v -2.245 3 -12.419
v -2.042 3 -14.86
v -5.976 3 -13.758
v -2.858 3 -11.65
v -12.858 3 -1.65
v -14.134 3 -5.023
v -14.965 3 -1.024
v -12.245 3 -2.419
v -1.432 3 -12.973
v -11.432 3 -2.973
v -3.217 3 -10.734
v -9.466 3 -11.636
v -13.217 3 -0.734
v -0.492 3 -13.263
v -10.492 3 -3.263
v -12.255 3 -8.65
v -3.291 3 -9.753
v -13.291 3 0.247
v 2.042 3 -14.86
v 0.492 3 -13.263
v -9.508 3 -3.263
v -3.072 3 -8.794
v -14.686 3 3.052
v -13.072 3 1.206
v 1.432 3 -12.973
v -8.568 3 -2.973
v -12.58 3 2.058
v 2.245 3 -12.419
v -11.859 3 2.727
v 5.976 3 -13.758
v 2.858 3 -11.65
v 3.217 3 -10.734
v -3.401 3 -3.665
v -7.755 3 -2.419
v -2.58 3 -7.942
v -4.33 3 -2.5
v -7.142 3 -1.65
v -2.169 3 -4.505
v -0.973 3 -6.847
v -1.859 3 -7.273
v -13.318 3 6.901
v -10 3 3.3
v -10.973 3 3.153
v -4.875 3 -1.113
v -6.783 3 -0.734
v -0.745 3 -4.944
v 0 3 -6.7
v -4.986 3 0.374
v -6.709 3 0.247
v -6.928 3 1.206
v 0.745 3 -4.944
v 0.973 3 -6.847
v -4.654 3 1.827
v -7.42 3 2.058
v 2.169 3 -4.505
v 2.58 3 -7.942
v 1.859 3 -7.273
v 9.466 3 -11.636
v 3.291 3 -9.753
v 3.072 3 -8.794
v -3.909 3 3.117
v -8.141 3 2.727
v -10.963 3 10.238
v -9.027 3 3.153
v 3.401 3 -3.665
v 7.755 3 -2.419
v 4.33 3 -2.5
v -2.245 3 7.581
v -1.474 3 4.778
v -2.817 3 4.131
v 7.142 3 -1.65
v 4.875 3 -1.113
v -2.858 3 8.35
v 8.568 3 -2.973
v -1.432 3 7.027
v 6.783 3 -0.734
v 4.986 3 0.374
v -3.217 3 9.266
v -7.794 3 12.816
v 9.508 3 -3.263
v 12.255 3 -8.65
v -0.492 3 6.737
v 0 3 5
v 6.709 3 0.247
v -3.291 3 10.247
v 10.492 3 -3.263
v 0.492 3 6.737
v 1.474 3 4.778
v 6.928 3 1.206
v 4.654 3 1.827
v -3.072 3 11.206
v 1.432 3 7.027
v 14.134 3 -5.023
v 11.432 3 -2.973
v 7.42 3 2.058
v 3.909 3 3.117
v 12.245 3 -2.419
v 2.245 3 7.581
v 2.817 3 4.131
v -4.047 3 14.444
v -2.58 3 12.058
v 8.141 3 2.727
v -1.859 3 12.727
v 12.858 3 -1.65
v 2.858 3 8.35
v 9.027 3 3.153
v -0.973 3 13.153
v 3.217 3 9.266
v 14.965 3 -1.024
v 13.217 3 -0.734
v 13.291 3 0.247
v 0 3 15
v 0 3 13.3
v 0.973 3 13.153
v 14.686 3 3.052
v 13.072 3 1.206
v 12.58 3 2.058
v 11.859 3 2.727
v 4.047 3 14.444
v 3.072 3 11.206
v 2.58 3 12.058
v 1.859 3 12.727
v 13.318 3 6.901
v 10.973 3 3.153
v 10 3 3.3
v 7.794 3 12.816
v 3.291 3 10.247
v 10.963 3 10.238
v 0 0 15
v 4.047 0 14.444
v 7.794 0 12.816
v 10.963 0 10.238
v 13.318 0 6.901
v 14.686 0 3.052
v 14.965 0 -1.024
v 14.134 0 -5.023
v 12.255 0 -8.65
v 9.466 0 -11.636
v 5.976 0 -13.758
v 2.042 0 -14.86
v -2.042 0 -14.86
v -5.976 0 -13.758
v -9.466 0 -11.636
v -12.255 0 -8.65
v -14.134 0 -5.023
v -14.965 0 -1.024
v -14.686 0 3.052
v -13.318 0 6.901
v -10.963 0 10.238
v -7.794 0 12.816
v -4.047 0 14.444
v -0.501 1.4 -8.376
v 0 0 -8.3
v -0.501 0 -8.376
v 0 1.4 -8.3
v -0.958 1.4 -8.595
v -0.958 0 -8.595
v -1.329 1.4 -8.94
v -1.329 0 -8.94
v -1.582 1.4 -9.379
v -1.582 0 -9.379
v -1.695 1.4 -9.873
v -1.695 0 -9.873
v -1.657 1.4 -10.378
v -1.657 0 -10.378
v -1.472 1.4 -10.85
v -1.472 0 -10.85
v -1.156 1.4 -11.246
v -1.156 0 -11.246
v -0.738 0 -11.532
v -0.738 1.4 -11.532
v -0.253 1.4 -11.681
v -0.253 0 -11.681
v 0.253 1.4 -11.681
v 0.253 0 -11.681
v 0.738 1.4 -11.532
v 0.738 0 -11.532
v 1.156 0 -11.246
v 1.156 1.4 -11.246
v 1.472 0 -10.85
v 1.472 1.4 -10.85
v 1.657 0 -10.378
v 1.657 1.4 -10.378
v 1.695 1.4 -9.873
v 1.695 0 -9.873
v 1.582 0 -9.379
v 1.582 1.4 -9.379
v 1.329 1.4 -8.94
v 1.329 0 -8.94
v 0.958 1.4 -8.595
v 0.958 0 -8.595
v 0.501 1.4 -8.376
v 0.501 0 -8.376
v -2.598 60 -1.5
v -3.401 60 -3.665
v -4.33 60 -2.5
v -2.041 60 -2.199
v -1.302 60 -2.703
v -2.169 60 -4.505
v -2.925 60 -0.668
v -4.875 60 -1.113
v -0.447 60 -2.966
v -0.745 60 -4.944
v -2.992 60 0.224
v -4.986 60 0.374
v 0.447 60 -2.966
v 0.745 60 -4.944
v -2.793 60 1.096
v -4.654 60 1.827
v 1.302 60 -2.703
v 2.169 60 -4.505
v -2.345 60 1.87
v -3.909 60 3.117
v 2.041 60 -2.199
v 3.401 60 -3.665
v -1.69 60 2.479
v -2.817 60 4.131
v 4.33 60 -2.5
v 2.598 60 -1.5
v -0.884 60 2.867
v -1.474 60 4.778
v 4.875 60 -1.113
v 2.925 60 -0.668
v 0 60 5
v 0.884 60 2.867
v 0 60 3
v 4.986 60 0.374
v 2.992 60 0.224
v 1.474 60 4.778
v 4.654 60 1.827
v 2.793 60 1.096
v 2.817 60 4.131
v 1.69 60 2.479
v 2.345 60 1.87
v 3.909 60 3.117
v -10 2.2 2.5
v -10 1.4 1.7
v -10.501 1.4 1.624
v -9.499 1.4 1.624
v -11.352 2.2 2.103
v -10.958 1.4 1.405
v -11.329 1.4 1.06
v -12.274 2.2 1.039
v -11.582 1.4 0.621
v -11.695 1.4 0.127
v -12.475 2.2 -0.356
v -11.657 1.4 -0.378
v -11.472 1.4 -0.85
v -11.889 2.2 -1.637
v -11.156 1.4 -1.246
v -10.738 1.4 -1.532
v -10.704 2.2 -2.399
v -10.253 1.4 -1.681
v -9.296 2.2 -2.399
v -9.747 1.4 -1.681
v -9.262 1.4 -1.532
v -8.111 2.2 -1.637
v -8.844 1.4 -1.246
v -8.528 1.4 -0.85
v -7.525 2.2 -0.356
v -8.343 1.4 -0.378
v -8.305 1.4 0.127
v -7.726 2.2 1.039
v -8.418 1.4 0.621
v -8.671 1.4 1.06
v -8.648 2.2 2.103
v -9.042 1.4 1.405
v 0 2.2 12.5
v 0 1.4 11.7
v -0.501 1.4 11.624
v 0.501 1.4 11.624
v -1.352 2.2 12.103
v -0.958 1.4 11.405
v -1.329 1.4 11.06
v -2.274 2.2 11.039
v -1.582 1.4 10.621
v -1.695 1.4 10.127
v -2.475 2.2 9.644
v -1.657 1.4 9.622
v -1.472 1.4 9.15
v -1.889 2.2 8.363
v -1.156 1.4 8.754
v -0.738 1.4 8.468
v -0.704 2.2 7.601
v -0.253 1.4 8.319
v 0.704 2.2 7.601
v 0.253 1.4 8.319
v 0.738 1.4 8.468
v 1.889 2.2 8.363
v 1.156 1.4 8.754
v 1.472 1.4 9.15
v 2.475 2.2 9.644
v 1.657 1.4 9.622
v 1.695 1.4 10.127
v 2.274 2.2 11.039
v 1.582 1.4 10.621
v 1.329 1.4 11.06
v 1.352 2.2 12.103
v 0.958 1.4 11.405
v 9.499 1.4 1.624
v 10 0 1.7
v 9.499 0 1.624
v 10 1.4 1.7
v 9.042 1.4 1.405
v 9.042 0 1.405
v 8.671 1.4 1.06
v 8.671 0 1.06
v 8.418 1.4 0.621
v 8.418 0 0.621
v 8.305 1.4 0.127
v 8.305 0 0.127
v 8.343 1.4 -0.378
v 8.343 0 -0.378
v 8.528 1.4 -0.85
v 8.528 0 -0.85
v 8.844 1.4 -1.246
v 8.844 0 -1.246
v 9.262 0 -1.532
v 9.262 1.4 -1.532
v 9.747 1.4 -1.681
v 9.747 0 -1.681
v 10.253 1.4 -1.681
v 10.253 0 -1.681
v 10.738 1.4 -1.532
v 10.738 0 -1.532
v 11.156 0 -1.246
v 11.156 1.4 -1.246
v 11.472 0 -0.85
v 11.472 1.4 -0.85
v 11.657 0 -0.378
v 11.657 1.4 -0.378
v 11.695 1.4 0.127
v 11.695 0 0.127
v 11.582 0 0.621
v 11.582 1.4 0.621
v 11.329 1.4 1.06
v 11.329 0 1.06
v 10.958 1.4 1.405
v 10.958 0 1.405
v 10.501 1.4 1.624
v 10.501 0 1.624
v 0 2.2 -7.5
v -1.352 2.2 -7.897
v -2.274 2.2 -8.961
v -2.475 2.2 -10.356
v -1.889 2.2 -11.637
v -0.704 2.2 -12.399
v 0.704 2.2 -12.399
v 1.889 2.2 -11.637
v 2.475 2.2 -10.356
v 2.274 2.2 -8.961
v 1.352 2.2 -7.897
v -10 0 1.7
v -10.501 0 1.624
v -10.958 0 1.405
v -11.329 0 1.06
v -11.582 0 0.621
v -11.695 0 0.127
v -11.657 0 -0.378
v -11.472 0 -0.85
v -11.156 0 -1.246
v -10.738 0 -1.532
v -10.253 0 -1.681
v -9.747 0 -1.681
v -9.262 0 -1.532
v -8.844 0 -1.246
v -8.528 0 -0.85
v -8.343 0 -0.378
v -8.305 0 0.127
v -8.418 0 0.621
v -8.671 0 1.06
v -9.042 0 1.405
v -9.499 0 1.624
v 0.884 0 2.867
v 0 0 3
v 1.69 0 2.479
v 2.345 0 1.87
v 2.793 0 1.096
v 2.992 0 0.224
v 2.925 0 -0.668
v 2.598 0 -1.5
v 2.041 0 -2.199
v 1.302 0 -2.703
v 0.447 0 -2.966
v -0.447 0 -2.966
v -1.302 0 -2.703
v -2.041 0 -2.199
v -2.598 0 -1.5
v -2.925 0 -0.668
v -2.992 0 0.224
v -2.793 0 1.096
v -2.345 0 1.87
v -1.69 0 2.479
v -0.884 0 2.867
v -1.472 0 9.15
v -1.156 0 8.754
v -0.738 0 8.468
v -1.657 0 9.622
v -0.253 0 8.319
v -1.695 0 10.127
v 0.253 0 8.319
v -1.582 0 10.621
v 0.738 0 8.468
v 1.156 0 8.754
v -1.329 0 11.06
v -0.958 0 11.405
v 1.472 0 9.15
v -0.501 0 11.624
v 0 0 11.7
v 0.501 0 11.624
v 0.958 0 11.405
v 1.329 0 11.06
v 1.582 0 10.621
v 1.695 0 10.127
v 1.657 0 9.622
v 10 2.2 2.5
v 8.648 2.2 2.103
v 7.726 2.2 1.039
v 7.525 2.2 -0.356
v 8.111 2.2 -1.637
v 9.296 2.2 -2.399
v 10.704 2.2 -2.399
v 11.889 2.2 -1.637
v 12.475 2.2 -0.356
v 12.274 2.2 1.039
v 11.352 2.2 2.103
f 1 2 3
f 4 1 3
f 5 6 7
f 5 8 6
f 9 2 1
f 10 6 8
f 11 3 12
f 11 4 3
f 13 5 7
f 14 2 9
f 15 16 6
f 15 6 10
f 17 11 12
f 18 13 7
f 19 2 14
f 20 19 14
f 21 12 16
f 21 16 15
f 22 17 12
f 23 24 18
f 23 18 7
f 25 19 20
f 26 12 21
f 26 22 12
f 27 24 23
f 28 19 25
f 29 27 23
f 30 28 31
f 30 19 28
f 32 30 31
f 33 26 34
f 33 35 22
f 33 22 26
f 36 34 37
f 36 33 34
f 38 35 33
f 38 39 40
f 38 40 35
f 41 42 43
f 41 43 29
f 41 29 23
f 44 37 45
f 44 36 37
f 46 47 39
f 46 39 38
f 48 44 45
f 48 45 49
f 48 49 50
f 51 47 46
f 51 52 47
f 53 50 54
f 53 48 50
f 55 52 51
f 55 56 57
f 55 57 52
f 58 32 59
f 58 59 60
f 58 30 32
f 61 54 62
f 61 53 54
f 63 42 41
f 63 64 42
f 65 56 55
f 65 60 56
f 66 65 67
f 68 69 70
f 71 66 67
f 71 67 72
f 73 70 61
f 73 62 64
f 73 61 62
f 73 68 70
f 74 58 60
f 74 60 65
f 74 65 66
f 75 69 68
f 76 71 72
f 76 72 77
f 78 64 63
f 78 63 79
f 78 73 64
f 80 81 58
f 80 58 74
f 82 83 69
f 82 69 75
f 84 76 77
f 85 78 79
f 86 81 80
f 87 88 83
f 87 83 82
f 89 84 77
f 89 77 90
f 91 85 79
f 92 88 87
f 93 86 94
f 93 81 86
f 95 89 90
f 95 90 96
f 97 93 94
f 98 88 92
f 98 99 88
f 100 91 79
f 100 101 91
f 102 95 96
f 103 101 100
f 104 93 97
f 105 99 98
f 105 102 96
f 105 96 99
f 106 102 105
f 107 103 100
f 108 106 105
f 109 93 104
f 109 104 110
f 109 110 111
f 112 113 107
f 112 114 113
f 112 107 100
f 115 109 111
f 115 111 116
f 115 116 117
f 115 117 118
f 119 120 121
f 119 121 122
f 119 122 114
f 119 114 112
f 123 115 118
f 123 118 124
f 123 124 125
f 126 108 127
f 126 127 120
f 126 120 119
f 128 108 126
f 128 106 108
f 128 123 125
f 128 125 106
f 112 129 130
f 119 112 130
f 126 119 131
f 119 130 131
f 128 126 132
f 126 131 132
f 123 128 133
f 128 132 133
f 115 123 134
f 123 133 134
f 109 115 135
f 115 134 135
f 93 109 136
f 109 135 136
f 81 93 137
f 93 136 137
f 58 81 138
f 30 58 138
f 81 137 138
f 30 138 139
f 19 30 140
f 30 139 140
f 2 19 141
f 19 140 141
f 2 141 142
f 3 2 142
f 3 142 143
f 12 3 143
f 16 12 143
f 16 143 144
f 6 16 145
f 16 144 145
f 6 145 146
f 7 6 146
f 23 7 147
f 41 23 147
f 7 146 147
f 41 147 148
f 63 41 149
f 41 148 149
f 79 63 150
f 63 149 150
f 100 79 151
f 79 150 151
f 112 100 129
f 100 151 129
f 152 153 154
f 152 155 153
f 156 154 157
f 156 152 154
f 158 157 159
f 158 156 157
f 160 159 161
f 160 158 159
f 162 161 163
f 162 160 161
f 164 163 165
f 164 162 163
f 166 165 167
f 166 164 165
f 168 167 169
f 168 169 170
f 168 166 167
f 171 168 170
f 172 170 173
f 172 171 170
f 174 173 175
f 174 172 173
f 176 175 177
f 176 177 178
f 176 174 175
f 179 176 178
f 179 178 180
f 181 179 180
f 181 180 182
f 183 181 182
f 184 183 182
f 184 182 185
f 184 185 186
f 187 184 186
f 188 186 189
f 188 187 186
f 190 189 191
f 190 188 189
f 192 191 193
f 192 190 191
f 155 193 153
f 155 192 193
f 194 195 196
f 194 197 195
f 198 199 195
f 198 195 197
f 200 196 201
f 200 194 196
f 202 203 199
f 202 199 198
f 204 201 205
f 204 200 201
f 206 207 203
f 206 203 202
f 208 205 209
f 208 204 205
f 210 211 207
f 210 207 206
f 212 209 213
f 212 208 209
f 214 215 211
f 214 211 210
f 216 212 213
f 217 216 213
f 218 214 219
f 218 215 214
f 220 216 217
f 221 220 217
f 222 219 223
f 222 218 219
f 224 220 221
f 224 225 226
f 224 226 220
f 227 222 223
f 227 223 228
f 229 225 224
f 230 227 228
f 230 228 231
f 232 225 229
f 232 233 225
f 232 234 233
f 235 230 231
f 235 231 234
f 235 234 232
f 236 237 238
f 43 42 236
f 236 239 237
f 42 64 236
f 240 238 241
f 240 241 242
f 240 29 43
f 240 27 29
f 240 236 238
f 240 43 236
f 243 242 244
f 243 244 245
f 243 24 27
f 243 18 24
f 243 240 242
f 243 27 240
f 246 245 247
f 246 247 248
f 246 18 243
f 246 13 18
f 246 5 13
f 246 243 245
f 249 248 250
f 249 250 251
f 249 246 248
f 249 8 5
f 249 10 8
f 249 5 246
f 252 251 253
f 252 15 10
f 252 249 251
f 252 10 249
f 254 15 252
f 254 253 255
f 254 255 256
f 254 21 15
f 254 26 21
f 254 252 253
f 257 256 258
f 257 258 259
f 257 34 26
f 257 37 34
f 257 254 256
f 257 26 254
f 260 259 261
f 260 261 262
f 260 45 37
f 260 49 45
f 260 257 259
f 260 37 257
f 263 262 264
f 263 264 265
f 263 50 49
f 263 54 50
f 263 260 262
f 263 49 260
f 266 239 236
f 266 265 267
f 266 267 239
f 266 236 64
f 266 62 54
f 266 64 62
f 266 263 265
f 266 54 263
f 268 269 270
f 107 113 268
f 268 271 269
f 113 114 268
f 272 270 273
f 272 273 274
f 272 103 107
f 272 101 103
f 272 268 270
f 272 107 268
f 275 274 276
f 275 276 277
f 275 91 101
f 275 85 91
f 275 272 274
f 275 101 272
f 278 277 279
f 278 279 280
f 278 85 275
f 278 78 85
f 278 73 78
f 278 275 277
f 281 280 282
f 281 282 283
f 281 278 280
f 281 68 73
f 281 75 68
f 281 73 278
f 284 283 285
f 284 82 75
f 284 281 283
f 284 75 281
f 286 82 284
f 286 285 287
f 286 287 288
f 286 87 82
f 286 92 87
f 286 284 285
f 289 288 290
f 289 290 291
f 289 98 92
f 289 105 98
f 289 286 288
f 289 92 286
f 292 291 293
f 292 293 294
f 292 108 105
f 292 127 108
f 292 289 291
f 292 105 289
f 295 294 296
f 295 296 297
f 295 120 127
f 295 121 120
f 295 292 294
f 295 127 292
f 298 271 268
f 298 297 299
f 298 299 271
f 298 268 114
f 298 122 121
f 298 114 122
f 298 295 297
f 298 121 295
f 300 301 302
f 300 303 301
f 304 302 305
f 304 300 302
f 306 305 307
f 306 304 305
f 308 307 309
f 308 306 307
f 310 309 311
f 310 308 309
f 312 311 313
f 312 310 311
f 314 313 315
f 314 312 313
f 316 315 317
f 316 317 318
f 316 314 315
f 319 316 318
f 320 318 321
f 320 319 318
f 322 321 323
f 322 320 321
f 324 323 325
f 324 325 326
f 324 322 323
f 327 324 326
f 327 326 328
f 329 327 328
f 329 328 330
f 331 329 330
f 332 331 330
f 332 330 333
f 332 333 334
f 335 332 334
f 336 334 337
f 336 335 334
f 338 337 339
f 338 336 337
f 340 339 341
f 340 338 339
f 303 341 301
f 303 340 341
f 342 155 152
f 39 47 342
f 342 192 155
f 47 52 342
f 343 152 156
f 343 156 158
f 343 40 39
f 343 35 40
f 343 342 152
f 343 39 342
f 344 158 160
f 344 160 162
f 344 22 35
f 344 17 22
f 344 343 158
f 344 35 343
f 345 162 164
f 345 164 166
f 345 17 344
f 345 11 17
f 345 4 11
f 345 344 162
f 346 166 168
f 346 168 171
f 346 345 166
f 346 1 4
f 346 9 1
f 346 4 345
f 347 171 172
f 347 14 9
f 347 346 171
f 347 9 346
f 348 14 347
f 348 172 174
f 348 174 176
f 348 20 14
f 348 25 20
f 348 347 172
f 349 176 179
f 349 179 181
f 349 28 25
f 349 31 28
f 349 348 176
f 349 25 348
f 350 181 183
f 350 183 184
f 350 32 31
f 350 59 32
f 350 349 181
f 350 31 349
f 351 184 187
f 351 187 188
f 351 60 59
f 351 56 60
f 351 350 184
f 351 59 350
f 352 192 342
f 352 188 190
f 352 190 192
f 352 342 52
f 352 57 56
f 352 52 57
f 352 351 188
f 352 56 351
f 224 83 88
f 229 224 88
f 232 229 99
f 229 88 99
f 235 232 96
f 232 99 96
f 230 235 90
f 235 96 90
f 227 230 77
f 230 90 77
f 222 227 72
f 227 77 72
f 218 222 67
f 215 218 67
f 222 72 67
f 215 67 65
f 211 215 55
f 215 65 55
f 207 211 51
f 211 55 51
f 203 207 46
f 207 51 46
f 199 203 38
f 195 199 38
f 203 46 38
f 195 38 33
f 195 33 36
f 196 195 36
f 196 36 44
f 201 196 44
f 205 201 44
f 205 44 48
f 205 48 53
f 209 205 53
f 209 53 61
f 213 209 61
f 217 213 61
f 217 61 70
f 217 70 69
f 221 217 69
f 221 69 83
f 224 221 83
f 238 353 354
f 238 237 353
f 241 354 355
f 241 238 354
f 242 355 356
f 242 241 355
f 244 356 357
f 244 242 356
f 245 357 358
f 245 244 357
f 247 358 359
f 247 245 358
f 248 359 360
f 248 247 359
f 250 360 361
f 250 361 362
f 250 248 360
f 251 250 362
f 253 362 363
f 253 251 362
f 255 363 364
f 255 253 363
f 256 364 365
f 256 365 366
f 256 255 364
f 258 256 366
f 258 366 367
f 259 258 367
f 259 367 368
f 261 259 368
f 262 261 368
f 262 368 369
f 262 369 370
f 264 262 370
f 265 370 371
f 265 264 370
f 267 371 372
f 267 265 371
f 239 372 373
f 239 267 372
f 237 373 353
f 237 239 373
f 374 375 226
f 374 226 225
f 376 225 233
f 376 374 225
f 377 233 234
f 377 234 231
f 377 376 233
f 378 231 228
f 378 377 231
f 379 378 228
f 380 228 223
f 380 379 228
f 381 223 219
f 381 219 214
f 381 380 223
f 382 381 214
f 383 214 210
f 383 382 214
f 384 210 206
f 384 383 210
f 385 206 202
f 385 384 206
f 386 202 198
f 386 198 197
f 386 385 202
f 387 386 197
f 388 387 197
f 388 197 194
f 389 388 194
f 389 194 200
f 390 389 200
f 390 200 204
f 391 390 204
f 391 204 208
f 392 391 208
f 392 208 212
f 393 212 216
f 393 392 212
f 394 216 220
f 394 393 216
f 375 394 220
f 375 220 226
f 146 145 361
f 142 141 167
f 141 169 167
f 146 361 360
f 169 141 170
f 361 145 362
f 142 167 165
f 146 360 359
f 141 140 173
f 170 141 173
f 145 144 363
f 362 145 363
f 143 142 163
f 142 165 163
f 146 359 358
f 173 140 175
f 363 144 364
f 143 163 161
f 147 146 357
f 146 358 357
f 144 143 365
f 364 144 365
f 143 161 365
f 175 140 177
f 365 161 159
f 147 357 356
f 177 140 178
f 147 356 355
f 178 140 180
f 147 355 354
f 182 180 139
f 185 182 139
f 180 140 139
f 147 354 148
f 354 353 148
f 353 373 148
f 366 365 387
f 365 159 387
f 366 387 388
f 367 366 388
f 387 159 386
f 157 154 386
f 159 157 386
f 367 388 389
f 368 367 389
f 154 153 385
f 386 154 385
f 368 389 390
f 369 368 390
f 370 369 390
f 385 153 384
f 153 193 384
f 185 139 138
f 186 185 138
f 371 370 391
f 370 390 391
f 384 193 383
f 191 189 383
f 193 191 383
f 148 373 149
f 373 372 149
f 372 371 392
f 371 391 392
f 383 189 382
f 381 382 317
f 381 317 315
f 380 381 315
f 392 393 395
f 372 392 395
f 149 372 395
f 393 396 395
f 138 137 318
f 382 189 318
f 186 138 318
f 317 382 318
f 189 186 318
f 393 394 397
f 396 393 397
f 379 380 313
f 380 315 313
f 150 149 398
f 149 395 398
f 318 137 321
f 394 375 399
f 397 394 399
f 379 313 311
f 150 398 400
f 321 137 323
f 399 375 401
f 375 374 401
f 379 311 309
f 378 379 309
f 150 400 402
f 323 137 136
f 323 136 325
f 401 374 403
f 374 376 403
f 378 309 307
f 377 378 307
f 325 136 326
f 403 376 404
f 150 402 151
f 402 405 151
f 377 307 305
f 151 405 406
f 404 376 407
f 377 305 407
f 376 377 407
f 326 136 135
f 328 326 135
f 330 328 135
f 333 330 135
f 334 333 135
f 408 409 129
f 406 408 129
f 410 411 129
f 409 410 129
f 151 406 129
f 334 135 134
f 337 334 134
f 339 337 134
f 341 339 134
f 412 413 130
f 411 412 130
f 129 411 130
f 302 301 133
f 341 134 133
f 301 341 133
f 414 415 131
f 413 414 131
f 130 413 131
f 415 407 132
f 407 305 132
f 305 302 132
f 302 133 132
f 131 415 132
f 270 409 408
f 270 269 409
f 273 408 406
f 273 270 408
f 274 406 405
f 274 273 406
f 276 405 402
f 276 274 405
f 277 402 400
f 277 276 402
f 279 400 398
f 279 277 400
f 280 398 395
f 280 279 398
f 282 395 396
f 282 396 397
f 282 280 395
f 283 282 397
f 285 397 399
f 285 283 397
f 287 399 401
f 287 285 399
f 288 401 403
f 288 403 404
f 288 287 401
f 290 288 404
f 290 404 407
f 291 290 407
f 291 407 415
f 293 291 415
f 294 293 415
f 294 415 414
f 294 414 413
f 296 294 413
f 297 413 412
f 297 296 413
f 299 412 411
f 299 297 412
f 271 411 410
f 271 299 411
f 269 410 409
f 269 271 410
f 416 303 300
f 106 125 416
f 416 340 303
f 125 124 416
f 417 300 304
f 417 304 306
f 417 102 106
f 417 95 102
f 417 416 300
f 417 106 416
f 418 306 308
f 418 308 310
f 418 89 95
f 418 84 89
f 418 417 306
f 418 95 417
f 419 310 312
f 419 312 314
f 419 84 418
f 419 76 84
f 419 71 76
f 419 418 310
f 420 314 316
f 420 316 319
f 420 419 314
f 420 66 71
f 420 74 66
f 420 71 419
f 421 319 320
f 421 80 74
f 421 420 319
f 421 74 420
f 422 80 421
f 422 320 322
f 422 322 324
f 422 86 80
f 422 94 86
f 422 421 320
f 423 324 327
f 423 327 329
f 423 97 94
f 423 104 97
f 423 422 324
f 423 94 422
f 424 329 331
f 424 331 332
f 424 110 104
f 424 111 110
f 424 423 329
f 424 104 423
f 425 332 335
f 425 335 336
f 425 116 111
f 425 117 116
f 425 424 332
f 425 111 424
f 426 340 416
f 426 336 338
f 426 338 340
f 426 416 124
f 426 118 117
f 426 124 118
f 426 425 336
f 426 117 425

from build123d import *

# Parameters (mm, degrees)
SKETCH_1_R               = 5
SKETCH_1_R_2             = 3
EXTRUDE_2_DEPTH          = 60
SKETCH_2_R               = 15
SKETCH_2_R_2             = 5
EXTRUDE_3_DEPTH          = 3
HOLE_WIZARD_1_AT_2_COUNT = 2
HOLE_WIZARD_1_AT_2_PITCH = 14.142135624
HOLE_WIZARD_1_AT_3_COUNT = 2
HOLE_WIZARD_1_AT_3_PITCH = 20
HOLE_WIZARD_1_AT_4_COUNT = 2
HOLE_WIZARD_1_AT_4_PITCH = 14.142135624


with BuildPart() as part:
    # 草图1 → 凸台-拉伸2 (new body)
    with BuildSketch(Plane(origin=(0, 0, 0), x_dir=(1, 0, 0), z_dir=(0, 1, 0))):
        with Locations(Location((0, 0, 0), (0, 0, 270))):
            Circle(SKETCH_1_R)
        with Locations(Location((0, 0, 0), (0, 0, 270))):
            Circle(SKETCH_1_R_2, mode=Mode.SUBTRACT)
    extrude(amount=EXTRUDE_2_DEPTH)

    # 草图2 → 凸台-拉伸3 (add)
    with BuildSketch(Plane(origin=(0, 0, 0), x_dir=(1, 0, 0), z_dir=(0, 1, 0))):
        with Locations(Location((0, 0, 0), (0, 0, 270))):
            Circle(SKETCH_2_R)
        with Locations(Location((0, 0, 0), (0, 0, 270))):
            Circle(SKETCH_2_R_2, mode=Mode.SUBTRACT)
    extrude(amount=EXTRUDE_3_DEPTH)

    # 草图4 → 打孔尺寸(%根据)开槽沉头木螺钉的类型1 (revolve, cut)
    with BuildSketch(Plane(origin=(-10, 3, 0), x_dir=(0, 0, 1), z_dir=(1, 0, 0))):
        Polygon((0, 0), (0, 3), (1.7, 3), (1.7, 1.6), (3.3, 0), align=None)
    hole_wizard_1 = revolve(axis=Axis((-10, 9.35, 0), (0, -1, 0)), mode=Mode.SUBTRACT)

    # 打孔尺寸(%根据)开槽沉头木螺钉的类型1 at 2: 打孔尺寸(%根据)开槽沉头木螺钉的类型1 ×2
    with Locations(*[Vector(0.7071067811865476, 0, 0.7071067811865476) * (i * HOLE_WIZARD_1_AT_2_PITCH) for i in range(1, HOLE_WIZARD_1_AT_2_COUNT)]):
        add(hole_wizard_1, mode=Mode.SUBTRACT)

    # 打孔尺寸(%根据)开槽沉头木螺钉的类型1 at 3: 打孔尺寸(%根据)开槽沉头木螺钉的类型1 ×2
    with Locations(*[(i * HOLE_WIZARD_1_AT_3_PITCH, 0, 0) for i in range(1, HOLE_WIZARD_1_AT_3_COUNT)]):
        add(hole_wizard_1, mode=Mode.SUBTRACT)

    # 打孔尺寸(%根据)开槽沉头木螺钉的类型1 at 4: 打孔尺寸(%根据)开槽沉头木螺钉的类型1 ×2
    with Locations(*[Vector(0.7071067811865476, 0, -0.7071067811865476) * (i * HOLE_WIZARD_1_AT_4_PITCH) for i in range(1, HOLE_WIZARD_1_AT_4_COUNT)]):
        add(hole_wizard_1, mode=Mode.SUBTRACT)


solid = part.part
